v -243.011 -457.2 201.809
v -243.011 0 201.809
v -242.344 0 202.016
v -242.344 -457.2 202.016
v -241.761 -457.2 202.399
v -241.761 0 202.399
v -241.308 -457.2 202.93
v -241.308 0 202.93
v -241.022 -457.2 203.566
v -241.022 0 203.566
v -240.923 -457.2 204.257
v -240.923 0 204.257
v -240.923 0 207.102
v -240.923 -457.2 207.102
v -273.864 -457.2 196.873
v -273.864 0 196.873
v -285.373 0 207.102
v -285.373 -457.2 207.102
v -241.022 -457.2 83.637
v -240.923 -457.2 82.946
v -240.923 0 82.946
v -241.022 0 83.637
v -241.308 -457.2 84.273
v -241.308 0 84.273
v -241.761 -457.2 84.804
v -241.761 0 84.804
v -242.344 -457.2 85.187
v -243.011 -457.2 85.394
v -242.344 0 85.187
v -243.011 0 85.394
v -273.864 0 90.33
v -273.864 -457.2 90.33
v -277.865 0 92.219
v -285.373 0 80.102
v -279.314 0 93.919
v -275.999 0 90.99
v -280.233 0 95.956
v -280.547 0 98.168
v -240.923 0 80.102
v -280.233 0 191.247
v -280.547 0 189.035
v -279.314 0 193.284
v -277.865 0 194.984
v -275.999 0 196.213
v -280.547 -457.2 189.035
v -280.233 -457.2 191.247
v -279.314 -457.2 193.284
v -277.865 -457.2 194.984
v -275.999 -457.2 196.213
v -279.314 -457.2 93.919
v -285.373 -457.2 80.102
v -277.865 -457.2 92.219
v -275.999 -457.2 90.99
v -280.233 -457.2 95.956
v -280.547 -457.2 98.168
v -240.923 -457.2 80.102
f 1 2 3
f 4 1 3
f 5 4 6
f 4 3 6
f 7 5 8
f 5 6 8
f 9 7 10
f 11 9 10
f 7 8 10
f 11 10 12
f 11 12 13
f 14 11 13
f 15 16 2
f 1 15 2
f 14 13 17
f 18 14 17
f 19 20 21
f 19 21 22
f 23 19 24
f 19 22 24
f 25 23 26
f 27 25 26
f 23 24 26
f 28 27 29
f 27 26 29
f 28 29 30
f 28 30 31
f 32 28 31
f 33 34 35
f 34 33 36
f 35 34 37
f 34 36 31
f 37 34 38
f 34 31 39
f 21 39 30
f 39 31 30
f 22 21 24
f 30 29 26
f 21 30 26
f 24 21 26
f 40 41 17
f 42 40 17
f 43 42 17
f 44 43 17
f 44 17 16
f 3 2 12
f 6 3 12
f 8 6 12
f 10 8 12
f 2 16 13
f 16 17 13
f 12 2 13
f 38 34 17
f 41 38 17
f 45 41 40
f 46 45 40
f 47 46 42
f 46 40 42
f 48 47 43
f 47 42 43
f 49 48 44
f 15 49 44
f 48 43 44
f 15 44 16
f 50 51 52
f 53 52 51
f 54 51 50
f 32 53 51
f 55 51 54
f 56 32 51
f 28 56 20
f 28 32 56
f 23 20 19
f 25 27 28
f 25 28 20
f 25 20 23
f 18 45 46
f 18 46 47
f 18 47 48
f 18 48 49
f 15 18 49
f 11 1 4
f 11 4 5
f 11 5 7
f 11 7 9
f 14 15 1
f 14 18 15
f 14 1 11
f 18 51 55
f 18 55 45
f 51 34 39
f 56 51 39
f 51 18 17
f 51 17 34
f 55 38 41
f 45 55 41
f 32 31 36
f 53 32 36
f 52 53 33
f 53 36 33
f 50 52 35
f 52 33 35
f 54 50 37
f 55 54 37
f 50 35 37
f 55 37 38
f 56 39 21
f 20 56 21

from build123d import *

# Parameters (mm, degrees)
F1_DEPTH = 457.2
F0_W     = 25.4
F0_H     = 49.170082
F0_H_2   = 8.8030812
F0_H_3   = 4.7118778
F0_W_2   = 31.496
F0_H_4   = 25.4
F0_W_3   = 6.5532254
F0_H_5   = 4.729226
F0_H_6   = 8.769477
F0_H_7   = 49.202594
F0_W_4   = 31.3436
F0_W_5   = 9.0424
F0_H_8   = 4.724908
F0_H_9   = 8.777859
F0_H_10  = 49.194466
F0_H_11  = 4.9884076
F0_H_12  = 10.7895644
F0_H_13  = 70.044056
F0_W_6   = 35.56
F0_W_7   = 8.1534
F0_H_14  = 90.86723
F0_H_15  = 12.7743204
F0_H_16  = 5.2920646
F0_W_8   = 39.6239238
F0_W_9   = 8.2550254
F0_H_17  = 7.9246984
F0_H_18  = 11.1253016
F0_H_19  = 88.9
F0_H_20  = 11.1252762
F0_H_21  = 7.9247238
F0_H_22  = 7.9249016
F0_H_23  = 12.7
F0_H_24  = 111.1501968
F0_W_10  = 46.8120476
F0_W_11  = 7.9756762
F0_H_25  = 111.1505778
F0_W_12  = 55.5499016
F0_W_13  = 7.8739238
F0_H_26  = 11.0997238
F0_H_27  = 9.525
F0_H_28  = 11.0996984
F0_H_29  = 111.1503746
F0_W_14  = 43.6878222
F0_W_15  = 11.0999016
F0_W_16  = 66.675
F0_W_17  = 8.0264508
F0_H_30  = 14.2746984
F0_H_31  = 98.4505778
F0_H_32  = 14.2747238
F0_W_18  = 80.2641016
F0_W_19  = 8.6358984
F0_H_33  = 20.6247238
F0_H_34  = 6.35
F0_H_35  = 20.6246984


# Not quite as in the source:
# - ends of sketch curves that miss each other by under 0.0002 mm in the source are joined


with BuildPart() as f1:
    # F0 (on Front) → F1 (new body)
    with BuildSketch(Plane.XZ):
        with BuildLine():
            Line((-601.1868342, 387.2012576), (-601.1868342, 311.0012576))
            Line((-601.1868342, 311.0012576), (-565.3728342, 311.0012576))
            Line((-565.3728342, 311.0012576), (-565.3728342, 313.5336122))
            ThreePointArc((-565.3728342, 313.5336122), (-565.9005539947, 314.9657928472), (-567.2313750211, 315.7131515187))
            Line((-567.2313750211, 315.7131515187), (-592.8587584, 319.8135336))
            ThreePointArc((-592.8587584, 319.8135336), (-595.7302015679, 321.4260723396), (-596.8688342, 324.5162166))
            Line((-596.8688342, 324.5162166), (-596.8688342, 373.6862986))
            ThreePointArc((-596.8688342, 373.6862986), (-595.7302015679, 376.7764428604), (-592.8587590083, 378.388985402))
            Line((-592.8587590083, 378.388985402), (-567.2313776, 382.4893798))
            ThreePointArc((-567.2313776, 382.4893798), (-565.9005539947, 383.2367223528), (-565.3728342, 384.668903))
            Line((-565.3728342, 384.668903), (-565.3728342, 387.2012576))
            Line((-565.3728342, 387.2012576), (-601.1868342, 387.2012576))
        make_face()
    extrude(amount=F1_DEPTH)


with BuildPart() as f1b:
    # F0 (on Front) → F1, piece 2 (new body)
    with BuildSketch(Plane.XZ):
        Polygon((-490.1583542, 311.0012576), (-458.6623542, 311.0012576), (-458.6623542, 336.4012576), (-490.1583542, 336.4012576), (-490.1583542, 315.3192576), align=None)
        Polygon((-494.4763542, 311.0012576), (-490.1583542, 311.0012576), (-490.1583542, 315.3192576), align=None)
        Polygon((-490.1583542, 315.3192576), (-490.1583542, 336.4012576), (-494.4763542, 336.4012576), (-494.4763542, 311.0012576), align=None)
    extrude(amount=F1_DEPTH)


with BuildPart() as f1c:
    # F0 (on Front) → F1, piece 3 (new body)
    with BuildSketch(Plane.XZ):
        with Locations((-369.8588742, 349.1012576)):
            Rectangle(F0_W, F0_H)
        with Locations((-369.8588742, 378.0878392)):
            Rectangle(F0_W, F0_H_2)
        with Locations((-369.8588742, 384.8453187)):
            Rectangle(F0_W, F0_H_3)
        Polygon((-357.1588742, 315.7131354), (-357.1588742, 324.5162166), (-382.5588742, 324.5162166), (-382.5588742, 315.7131354), (-377.8469964, 315.7131354), align=None)
        Polygon((-357.1588742, 311.0012576), (-357.1588742, 315.7131354), (-377.8469964, 315.7131354), (-382.5588742, 311.0012576), align=None)
        Polygon((-377.8469964, 315.7131354), (-382.5588742, 315.7131354), (-382.5588742, 311.0012576), align=None)
    extrude(amount=F1_DEPTH)


with BuildPart() as f1d:
    # F0 (on Front) → F1, piece 4 (new body)
    with BuildSketch(Plane.XZ):
        with BuildLine():
            Line((-282.0713942, 387.2012576), (-282.0713942, 311.0012576))
            Line((-282.0713942, 311.0012576), (-244.2253942, 311.0012576))
            Line((-244.2253942, 311.0012576), (-244.2253942, 313.542934))
            ThreePointArc((-244.2253942, 313.542934), (-244.755053678, 314.9803842916), (-246.0907679772, 315.7304974926))
            Line((-246.0907679772, 315.7304974926), (-271.5081184, 319.7972776))
            ThreePointArc((-271.5081184, 319.7972776), (-274.3795615679, 321.4098163396), (-275.5181942, 324.4999606))
            Line((-275.5181942, 324.4999606), (-275.5181942, 373.7025546))
            ThreePointArc((-275.5181942, 373.7025546), (-274.3795615679, 376.7926988604), (-271.5081190083, 378.405241402))
            Line((-271.5081190083, 378.405241402), (-246.0907702, 382.4720316))
            ThreePointArc((-246.0907702, 382.4720316), (-244.755053678, 383.2221309084), (-244.2253942, 384.6595812))
            Line((-244.2253942, 384.6595812), (-244.2253942, 387.2012576))
            Line((-244.2253942, 387.2012576), (-282.0713942, 387.2012576))
        make_face()
    extrude(amount=F1_DEPTH)


with BuildPart() as f1e:
    # F0 (on Front) → F1, piece 5 (new body)
    with BuildSketch(Plane.XZ):
        with Locations((-153.1612888, 323.7012576)):
            Rectangle(F0_W_2, F0_H_4)
        with Locations((-172.1859015, 323.7012576)):
            Rectangle(F0_W_3, F0_H_4)
    extrude(amount=F1_DEPTH)


with BuildPart() as f1f:
    # F0 (on Front) → F1, piece 6 (new body)
    with BuildSketch(Plane.XZ):
        with Locations((-49.7274342, 384.8366446)):
            Rectangle(F0_W, F0_H_5)
        with Locations((-49.7274342, 378.0872931)):
            Rectangle(F0_W, F0_H_6)
        with Locations((-49.7274342, 349.1012576)):
            Rectangle(F0_W, F0_H_7)
        Polygon((-37.0274342, 324.4999606), (-62.4274342, 324.4999606), (-62.4274342, 315.7304836), (-57.6982082, 315.7304836), (-37.0274342, 315.7304836), align=None)
        Polygon((-57.6982082, 315.7304836), (-62.4274342, 315.7304836), (-62.4274342, 311.0012576), align=None)
        Polygon((-57.6982082, 315.7304836), (-62.4274342, 311.0012576), (-37.0274342, 311.0012576), (-37.0274342, 315.7304836), align=None)
    extrude(amount=F1_DEPTH)


with BuildPart() as f1g:
    # F0 (on Front) → F1, piece 7 (new body)
    with BuildSketch(Plane.XZ):
        with BuildLine():
            Line((36.7900458, 387.2012576), (36.7900458, 311.0012576))
            Line((36.7900458, 311.0012576), (77.1760458, 311.0012576))
            Line((77.1760458, 311.0012576), (77.1760458, 313.5405972))
            ThreePointArc((77.1760458, 313.5405972), (76.6468679067, 314.9767339928), (75.3123701078, 315.7261562738))
            Line((75.3123701078, 315.7261562738), (49.8425216, 319.8013416))
            ThreePointArc((49.8425216, 319.8013416), (46.9710784321, 321.4138803396), (45.8324458, 324.5040246))
            Line((45.8324458, 324.5040246), (45.8324458, 373.6984906))
            ThreePointArc((45.8324458, 373.6984906), (46.9710784321, 376.7886348604), (49.8425209917, 378.401177402))
            Line((49.8425209917, 378.401177402), (75.3123716, 382.4763496))
            ThreePointArc((75.3123716, 382.4763496), (76.6468679067, 383.2257812072), (77.1760458, 384.661918))
            Line((77.1760458, 384.661918), (77.1760458, 387.2012576))
            Line((77.1760458, 387.2012576), (36.7900458, 387.2012576))
        make_face()
    extrude(amount=F1_DEPTH)


with BuildPart() as f1h:
    # F0 (on Front) → F1, piece 8 (new body)
    with BuildSketch(Plane.XZ):
        with Locations((168.2020258, 323.7012576)):
            Rectangle(F0_W_4, F0_H_4)
        with Locations((148.0090258, 323.7012576)):
            Rectangle(F0_W_5, F0_H_4)
    extrude(amount=F1_DEPTH)


with BuildPart() as f1i:
    # F0 (on Front) → F1, piece 9 (new body)
    with BuildSketch(Plane.XZ):
        with Locations((270.4040058, 384.8388036)):
            Rectangle(F0_W, F0_H_8)
        with Locations((270.4040058, 378.0874201)):
            Rectangle(F0_W, F0_H_9)
        with Locations((270.4040058, 349.1012576)):
            Rectangle(F0_W, F0_H_10)
        Polygon((283.1040058, 324.5040246), (257.7040058, 324.5040246), (257.7040058, 315.7261656), (262.4289138, 315.7261656), (283.1040058, 315.7261656), align=None)
        Polygon((262.4289138, 315.7261656), (257.7040058, 315.7261656), (257.7040058, 311.0012576), align=None)
        Polygon((262.4289138, 315.7261656), (257.7040058, 311.0012576), (283.1040058, 311.0012576), (283.1040058, 315.7261656), align=None)
    extrude(amount=F1_DEPTH)


with BuildPart() as f1j:
    # F0 (on Front) → F1, piece 10 (new body)
    with BuildSketch(Plane.XZ):
        with BuildLine():
            Line((356.9976858, 412.6012576), (356.9976858, 311.0012576))
            Line((356.9976858, 311.0012576), (397.2312858, 311.0012576))
            Line((397.2312858, 311.0012576), (397.2312858, 313.6822276))
            ThreePointArc((397.2312858, 313.6822276), (396.6725971949, 315.1984578291), (395.2636770123, 315.9896790272))
            Line((395.2636770123, 315.9896790272), (367.0180366, 320.5089856))
            ThreePointArc((367.0180366, 320.5089856), (363.1894572183, 322.6590436143), (361.6712858, 326.7792296))
            Line((361.6712858, 326.7792296), (361.6712858, 396.8232856))
            ThreePointArc((361.6712858, 396.8232856), (363.1894572183, 400.9434715857), (367.0180362116, 403.0935320276))
            Line((367.0180362116, 403.0935320276), (395.2636748, 407.61285))
            ThreePointArc((395.2636748, 407.61285), (396.6725971949, 408.4040573709), (397.2312858, 409.9202876))
            Line((397.2312858, 409.9202876), (397.2312858, 412.6012576))
            Line((397.2312858, 412.6012576), (356.9976858, 412.6012576))
        make_face()
    extrude(amount=F1_DEPTH)


with BuildPart() as f1k:
    # F0 (on Front) → F1, piece 11 (new body)
    with BuildSketch(Plane.XZ):
        Polygon((468.3817658, 336.4012576), (463.7081658, 336.4012576), (463.7081658, 311.0012576), (468.3817658, 315.6748576), align=None)
        Polygon((503.9417658, 336.4012576), (468.3817658, 336.4012576), (468.3817658, 315.6748576), (468.3817658, 311.0012576), (503.9417658, 311.0012576), align=None)
        Polygon((468.3817658, 315.6748576), (463.7081658, 311.0012576), (468.3817658, 311.0012576), align=None)
    extrude(amount=F1_DEPTH)


with BuildPart() as f1l:
    # F0 (on Front) → F1, piece 12 (new body)
    with BuildSketch(Plane.XZ):
        with Locations((590.5354458, 410.1070538)):
            Rectangle(F0_W, F0_H_11)
        with Locations((590.5354458, 402.2180678)):
            Rectangle(F0_W, F0_H_12)
        with Locations((590.5354458, 361.8012576)):
            Rectangle(F0_W, F0_H_13)
        Polygon((603.2354458, 315.9896652), (603.2354458, 326.7792296), (577.8354458, 326.7792296), (577.8354458, 315.9896652), (582.8238534, 315.9896652), align=None)
        Polygon((603.2354458, 311.0012576), (603.2354458, 315.9896652), (582.8238534, 315.9896652), (577.8354458, 311.0012576), align=None)
        Polygon((577.8354458, 311.0012576), (582.8238534, 315.9896652), (577.8354458, 315.9896652), align=None)
    extrude(amount=F1_DEPTH)


with BuildPart() as f1m:
    # F0 (on Front) → F1, piece 13 (new body)
    with BuildSketch(Plane.XZ):
        with BuildLine():
            ThreePointArc((-591.6363837884, 89.6092671724), (-595.4649627817, 91.7593276143), (-596.9831342, 95.8795136))
            Line((-596.9831342, 95.8795136), (-596.9831342, 165.9235696))
            ThreePointArc((-596.9831342, 165.9235696), (-595.4649627817, 170.0437555857), (-591.6363837884, 172.1938160276))
            Line((-591.6363837884, 172.1938160276), (-563.3907452, 176.713134))
            ThreePointArc((-563.3907452, 176.713134), (-561.9818228051, 177.5043413709), (-561.4231342, 179.0205716))
            Line((-561.4231342, 179.0205716), (-561.4231342, 181.7015416))
            Line((-561.4231342, 181.7015416), (-605.1365342, 181.7015416))
            Line((-605.1365342, 181.7015416), (-605.1365342, 80.1015416))
            Line((-605.1365342, 80.1015416), (-561.4231342, 80.1015416))
            Line((-561.4231342, 80.1015416), (-561.4231342, 82.7825116))
            ThreePointArc((-561.4231342, 82.7825116), (-561.9818228051, 84.2987418291), (-563.3907429877, 85.0899630272))
            Line((-563.3907429877, 85.0899630272), (-591.6363837884, 89.6092671724))
        make_face()
    extrude(amount=F1_DEPTH)


with BuildPart() as f1n:
    # F0 (on Front) → F1, piece 14 (new body)
    with BuildSketch(Plane.XZ):
        with Locations((-472.5053542, 92.8015416)):
            Rectangle(F0_W_6, F0_H_4)
        with Locations((-494.3620542, 92.8015416)):
            Rectangle(F0_W_7, F0_H_4)
    extrude(amount=F1_DEPTH)


with BuildPart() as f1o:
    # F0 (on Front) → F1, piece 15 (new body)
    with BuildSketch(Plane.XZ):
        Polygon((-382.5588742, 80.1015416), (-357.1588742, 80.1015416), (-357.1588742, 85.0899492), (-377.5704666, 85.0899492), align=None)
        Polygon((-382.5588742, 85.0899492), (-382.5588742, 80.1015416), (-377.5704666, 85.0899492), align=None)
        Polygon((-377.5704666, 85.0899492), (-357.1588742, 85.0899492), (-357.1588742, 95.8795136), (-382.5588742, 95.8795136), (-382.5588742, 85.0899492), align=None)
        with Locations((-369.8588742, 130.9015416)):
            Rectangle(F0_W, F0_H_13)
        with Locations((-369.8588742, 171.3183518)):
            Rectangle(F0_W, F0_H_12)
        with Locations((-369.8588742, 179.2073378)):
            Rectangle(F0_W, F0_H_11)
    extrude(amount=F1_DEPTH)


with BuildPart() as f1p:
    # F0 (on Front) → F1, piece 16 (new body)
    with BuildSketch(Plane.XZ):
        with BuildLine():
            Line((-285.3733942, 207.1015416), (-285.3733942, 80.1015416))
            Line((-285.3733942, 80.1015416), (-240.9233942, 80.1015416))
            Line((-240.9233942, 80.1015416), (-240.9233942, 82.9457066))
            ThreePointArc((-240.9233942, 82.9457066), (-241.5160882904, 84.5542271722), (-243.0107654656, 85.3936107901))
            Line((-243.0107654656, 85.3936107901), (-273.863943, 90.3301216))
            ThreePointArc((-273.863943, 90.3301216), (-278.6496758587, 93.0176893467), (-280.5473942, 98.1679266))
            Line((-280.5473942, 98.1679266), (-280.5473942, 189.0351566))
            ThreePointArc((-280.5473942, 189.0351566), (-278.6496758587, 194.1853938533), (-273.8639438025, 196.8729666158))
            Line((-273.8639438025, 196.8729666158), (-243.0107662, 201.809477))
            ThreePointArc((-243.0107662, 201.809477), (-241.5160882904, 202.6488560278), (-240.9233942, 204.2573766))
            Line((-240.9233942, 204.2573766), (-240.9233942, 207.1015416))
            Line((-240.9233942, 207.1015416), (-285.3733942, 207.1015416))
        make_face()
    extrude(amount=F1_DEPTH)


with BuildPart() as f1q:
    # F0 (on Front) → F1, piece 17 (new body)
    with BuildSketch(Plane.XZ):
        Polygon((-173.8369142, 80.1015416), (-134.2129142, 80.1015416), (-134.2129142, 105.5015416), (-173.8369142, 105.5015416), (-173.8369142, 84.9275416), align=None)
        Polygon((-178.6629142, 80.1015416), (-173.8369142, 80.1015416), (-173.8369142, 84.9275416), align=None)
        Polygon((-173.8369142, 84.9275416), (-173.8369142, 105.5015416), (-178.6629142, 105.5015416), (-178.6629142, 80.1015416), align=None)
    extrude(amount=F1_DEPTH)


with BuildPart() as f1r:
    # F0 (on Front) → F1, piece 18 (new body)
    with BuildSketch(Plane.XZ):
        Polygon((-62.4274342, 80.1015416), (-37.0274342, 80.1015416), (-37.0274342, 85.3936062), (-57.1353696, 85.3936062), align=None)
        Polygon((-57.1353696, 85.3936062), (-37.0274342, 85.3936062), (-37.0274342, 98.1679266), (-62.4274342, 98.1679266), (-62.4274342, 85.3936062), align=None)
        Polygon((-62.4274342, 85.3936062), (-62.4274342, 80.1015416), (-57.1353696, 85.3936062), align=None)
        with Locations((-49.7274342, 143.6015416)):
            Rectangle(F0_W, F0_H_14)
        with Locations((-49.7274342, 195.4223168)):
            Rectangle(F0_W, F0_H_15)
        with Locations((-49.7274342, 204.4555093)):
            Rectangle(F0_W, F0_H_16)
    extrude(amount=F1_DEPTH)


with BuildPart() as f1s:
    # F0 (on Front) → F1, piece 19 (new body)
    with BuildSketch(Plane.XZ):
        with BuildLine():
            ThreePointArc((47.9819961975, 90.3301165842), (43.1962641413, 93.0176893467), (41.2985458, 98.1679266))
            Line((41.2985458, 98.1679266), (41.2985458, 189.0351566))
            ThreePointArc((41.2985458, 189.0351566), (43.1962641413, 194.1853938533), (47.9819961975, 196.8729666158))
            Line((47.9819961975, 196.8729666158), (78.8351738, 201.809477))
            ThreePointArc((78.8351738, 201.809477), (80.3298517096, 202.6488560278), (80.9225458, 204.2573766))
            Line((80.9225458, 204.2573766), (80.9225458, 207.1015416))
            Line((80.9225458, 207.1015416), (33.0435458, 207.1015416))
            Line((33.0435458, 207.1015416), (33.0435458, 80.1015416))
            Line((33.0435458, 80.1015416), (80.9225458, 80.1015416))
            Line((80.9225458, 80.1015416), (80.9225458, 82.9457066))
            ThreePointArc((80.9225458, 82.9457066), (80.3298517096, 84.5542271722), (78.8351745344, 85.3936107901))
            Line((78.8351745344, 85.3936107901), (47.9819961975, 90.3301165842))
        make_face()
    extrude(amount=F1_DEPTH)


with BuildPart() as f1t:
    # F0 (on Front) → F1, piece 20 (new body)
    with BuildSketch(Plane.XZ):
        with Locations((167.8083131, 92.8015416)):
            Rectangle(F0_W_8, F0_H_4)
        with Locations((143.8688385, 92.8015416)):
            Rectangle(F0_W_9, F0_H_4)
    extrude(amount=F1_DEPTH)


with BuildPart() as f1u:
    # F0 (on Front) → F1, piece 21 (new body)
    with BuildSketch(Plane.XZ):
        with Locations((270.4040058, 84.0638908)):
            Rectangle(F0_W, F0_H_17)
        with Locations((270.4040058, 93.5888908)):
            Rectangle(F0_W, F0_H_18)
        with Locations((270.4040058, 143.6015416)):
            Rectangle(F0_W, F0_H_19)
        with Locations((270.4040058, 193.6141797)):
            Rectangle(F0_W, F0_H_20)
        with Locations((270.4040058, 203.1391797)):
            Rectangle(F0_W, F0_H_21)
    extrude(amount=F1_DEPTH)


with BuildPart() as f1v:
    # F0 (on Front) → F1, piece 22 (new body)
    with BuildSketch(Plane.XZ):
        with BuildLine():
            ThreePointArc((365.8306401459, 91.025565362), (360.0877523662, 94.2506495524), (357.8104858, 100.4309396))
            Line((357.8104858, 100.4309396), (357.8104858, 212.1721436))
            ThreePointArc((357.8104858, 212.1721436), (360.0877523662, 218.3524336476), (365.8306401459, 221.577517838))
            Line((365.8306401459, 221.577517838), (399.3020462, 226.9329472))
            ThreePointArc((399.3020462, 226.9329472), (400.8748228991, 227.816191046), (401.4984858, 229.5087612))
            Line((401.4984858, 229.5087612), (401.4984858, 232.5015416))
            Line((401.4984858, 232.5015416), (352.7304858, 232.5015416))
            Line((352.7304858, 232.5015416), (352.7304858, 80.1015416))
            Line((352.7304858, 80.1015416), (401.4984858, 80.1015416))
            Line((401.4984858, 80.1015416), (401.4984858, 83.094322))
            ThreePointArc((401.4984858, 83.094322), (400.8748228991, 84.786892154), (399.3020465678, 85.6701382986))
            Line((399.3020465678, 85.6701382986), (365.8306401459, 91.025565362))
        make_face()
    extrude(amount=F1_DEPTH)


with BuildPart() as f1w:
    # F0 (on Front) → F1, piece 23 (new body)
    with BuildSketch(Plane.XZ):
        Polygon((464.5209912, 80.1015416), (508.208915, 80.1015416), (508.208915, 105.5015416), (464.5209912, 105.5015416), (464.5209912, 85.181567), align=None)
        Polygon((459.4409658, 80.1015416), (464.5209912, 80.1015416), (464.5209912, 85.181567), align=None)
        Polygon((464.5209912, 85.181567), (464.5209912, 105.5015416), (459.4409658, 105.5015416), (459.4409658, 80.1015416), align=None)
    extrude(amount=F1_DEPTH)


with BuildPart() as f1x:
    # F0 (on Front) → F1, piece 24 (new body)
    with BuildSketch(Plane.XZ):
        with Locations((590.5354458, 228.5390908)):
            Rectangle(F0_W, F0_H_22)
        with Locations((590.5354458, 218.22664)):
            Rectangle(F0_W, F0_H_23)
        with Locations((590.5354458, 156.3015416)):
            Rectangle(F0_W, F0_H_24)
        with Locations((590.5354458, 94.3764432)):
            Rectangle(F0_W, F0_H_23)
        with Locations((590.5354458, 84.0639924)):
            Rectangle(F0_W, F0_H_22)
    extrude(amount=F1_DEPTH)


with BuildPart() as f1y:
    # F0 (on Front) → F1, piece 25 (new body)
    with BuildSketch(Plane.XZ):
        with BuildLine():
            Line((-609.1116342, 1.6018256), (-609.1116342, -150.7981744))
            Line((-609.1116342, -150.7981744), (-557.4480342, -150.7981744))
            Line((-557.4480342, -150.7981744), (-557.4480342, -147.805394))
            ThreePointArc((-557.4480342, -147.805394), (-558.0716971009, -146.112823846), (-559.6444734322, -145.2295777014))
            Line((-559.6444734322, -145.2295777014), (-593.1158826, -139.8741678))
            ThreePointArc((-593.1158826, -139.8741678), (-598.8587676338, -136.6490664476), (-601.1360342, -130.4687764))
            Line((-601.1360342, -130.4687764), (-601.1360342, -18.7275724))
            ThreePointArc((-601.1360342, -18.7275724), (-598.8587676338, -12.5472823524), (-593.1158798541, -9.322198162))
            Line((-593.1158798541, -9.322198162), (-559.6444738, -3.9667688))
            ThreePointArc((-559.6444738, -3.9667688), (-558.0716971009, -3.083524954), (-557.4480342, -1.3909548))
            Line((-557.4480342, -1.3909548), (-557.4480342, 1.6018256))
            Line((-557.4480342, 1.6018256), (-609.1116342, 1.6018256))
        make_face()
    extrude(amount=F1_DEPTH)


with BuildPart() as f1z:
    # F0 (on Front) → F1, piece 26 (new body)
    with BuildSketch(Plane.XZ):
        with Locations((-472.5942542, -138.0981744)):
            Rectangle(F0_W_10, F0_H_4)
        with Locations((-499.9881161, -138.0981744)):
            Rectangle(F0_W_11, F0_H_4)
    extrude(amount=F1_DEPTH)


with BuildPart() as f1ba:
    # F0 (on Front) → F1, piece 27 (new body)
    with BuildSketch(Plane.XZ):
        with Locations((-369.8588742, -146.8358252)):
            Rectangle(F0_W, F0_H_17)
        with Locations((-369.8588742, -136.523476)):
            Rectangle(F0_W, F0_H_23)
        with Locations((-369.8588742, -74.5981871)):
            Rectangle(F0_W, F0_H_25)
        with Locations((-369.8588742, -12.6728982)):
            Rectangle(F0_W, F0_H_23)
        with Locations((-369.8588742, -2.3605363)):
            Rectangle(F0_W, F0_H_21)
    extrude(amount=F1_DEPTH)


with BuildPart() as f1bb:
    # F0 (on Front) → F1, piece 28 (new body)
    with BuildSketch(Plane.XZ):
        with BuildLine():
            Line((-294.8602942, 1.6018256), (-294.8602942, -150.7981744))
            Line((-294.8602942, -150.7981744), (-231.4364942, -150.7981744))
            Line((-231.4364942, -150.7981744), (-231.4364942, -147.883499))
            ThreePointArc((-231.4364942, -147.883499), (-232.043887476, -146.2350911736), (-233.5756320118, -145.3748972241))
            Line((-233.5756320118, -145.3748972241), (-278.9661426, -138.1124238))
            ThreePointArc((-278.9661426, -138.1124238), (-284.7090276338, -134.8873224476), (-286.9862942, -128.7070324))
            Line((-286.9862942, -128.7070324), (-286.9862942, -20.4893164))
            ThreePointArc((-286.9862942, -20.4893164), (-284.7090276338, -14.3090263524), (-278.9661398541, -11.083942162))
            Line((-278.9661398541, -11.083942162), (-233.5756314, -3.8214554))
            ThreePointArc((-233.5756314, -3.8214554), (-232.043887476, -2.9612576264), (-231.4364942, -1.3128498))
            Line((-231.4364942, -1.3128498), (-231.4364942, 1.6018256))
            Line((-231.4364942, 1.6018256), (-294.8602942, 1.6018256))
        make_face()
    extrude(amount=F1_DEPTH)


with BuildPart() as f1bc:
    # F0 (on Front) → F1, piece 29 (new body)
    with BuildSketch(Plane.XZ):
        with Locations((-152.5009396, -138.0981744)):
            Rectangle(F0_W_12, F0_H_4)
        with Locations((-184.2128523, -138.0981744)):
            Rectangle(F0_W_13, F0_H_4)
    extrude(amount=F1_DEPTH)


with BuildPart() as f1bd:
    # F0 (on Front) → F1, piece 30 (new body)
    with BuildSketch(Plane.XZ):
        with Locations((-49.7274342, -13.4730363)):
            Rectangle(F0_W, F0_H_26)
        with Locations((-49.7274342, -74.5981871)):
            Rectangle(F0_W, F0_H_25)
        with Locations((-49.7274342, -3.1606744)):
            Rectangle(F0_W, F0_H_27)
        with Locations((-49.7274342, -135.7233252)):
            Rectangle(F0_W, F0_H_28)
        with Locations((-49.7274342, -146.0356744)):
            Rectangle(F0_W, F0_H_27)
    extrude(amount=F1_DEPTH)


with BuildPart() as f1be:
    # F0 (on Front) → F1, piece 31 (new body)
    with BuildSketch(Plane.XZ):
        with BuildLine():
            Line((29.5891458, 1.6018256), (29.5891458, -150.7981744))
            Line((29.5891458, -150.7981744), (84.3769458, -150.7981744))
            Line((84.3769458, -150.7981744), (84.3769458, -147.805394))
            ThreePointArc((84.3769458, -147.805394), (83.7532828991, -146.112823846), (82.1805065678, -145.2295777014))
            Line((82.1805065678, -145.2295777014), (48.7090974, -139.8741678))
            ThreePointArc((48.7090974, -139.8741678), (42.9662123662, -136.6490664476), (40.6889458, -130.4687764))
            Line((40.6889458, -130.4687764), (40.6889458, -18.7275724))
            ThreePointArc((40.6889458, -18.7275724), (42.9662123662, -12.5472823524), (48.7091001459, -9.322198162))
            Line((48.7091001459, -9.322198162), (82.1805062, -3.9667688))
            ThreePointArc((82.1805062, -3.9667688), (83.7532828991, -3.083524954), (84.3769458, -1.3909548))
            Line((84.3769458, -1.3909548), (84.3769458, 1.6018256))
            Line((84.3769458, 1.6018256), (29.5891458, 1.6018256))
        make_face()
    extrude(amount=F1_DEPTH)


with BuildPart() as f1bf:
    # F0 (on Front) → F1, piece 32 (new body)
    with BuildSketch(Plane.XZ):
        with Locations((163.6935258, -74.5982633)):
            Rectangle(F0_W, F0_H_29)
        with Locations((163.6935258, -136.5234506)):
            Rectangle(F0_W, F0_H_23)
        with Locations((163.6935258, -12.673076)):
            Rectangle(F0_W, F0_H_23)
        with Locations((163.6935258, -146.8358125)):
            Rectangle(F0_W, F0_H_21)
        with Locations((163.6935258, -2.3606252)):
            Rectangle(F0_W, F0_H_22)
    extrude(amount=F1_DEPTH)


with BuildPart() as f1bg:
    # F0 (on Front) → F1, piece 33 (new body)
    with BuildSketch(Plane.XZ):
        with Locations((275.9412185, -138.0981744)):
            Rectangle(F0_W_14, F0_H_4)
        with Locations((248.5473566, -138.0981744)):
            Rectangle(F0_W_15, F0_H_4)
    extrude(amount=F1_DEPTH)


with BuildPart() as f1bh:
    # F0 (on Front) → F1, piece 34 (new body)
    with BuildSketch(Plane.XZ):
        with BuildLine():
            Line((339.7637858, 1.6018256), (339.7637858, -150.7981744))
            Line((339.7637858, -150.7981744), (414.4651858, -150.7981744))
            Line((414.4651858, -150.7981744), (414.4651858, -146.9369934))
            ThreePointArc((414.4651858, -146.9369934), (413.6605551761, -144.7532950948), (411.6314087753, -143.6137629043))
            Line((411.6314087753, -143.6137629043), (355.8103374, -134.6824078))
            ThreePointArc((355.8103374, -134.6824078), (350.0674523662, -131.4573064476), (347.7901858, -125.2770164))
            Line((347.7901858, -125.2770164), (347.7901858, -23.9193324))
            ThreePointArc((347.7901858, -23.9193324), (350.0674523662, -17.7390423524), (355.8103401459, -14.513958162))
            Line((355.8103401459, -14.513958162), (411.6314094, -5.5825898))
            ThreePointArc((411.6314094, -5.5825898), (413.6605551761, -4.4430537052), (414.4651858, -2.2593554))
            Line((414.4651858, -2.2593554), (414.4651858, 1.6018256))
            Line((414.4651858, 1.6018256), (339.7637858, 1.6018256))
        make_face()
    extrude(amount=F1_DEPTH)


with BuildPart() as f1bi:
    # F0 (on Front) → F1, piece 35 (new body)
    with BuildSketch(Plane.XZ):
        with Locations((487.8382166, -138.0981744)):
            Rectangle(F0_W_16, F0_H_4)
        with Locations((450.4874912, -138.0981744)):
            Rectangle(F0_W_17, F0_H_4)
    extrude(amount=F1_DEPTH)


with BuildPart() as f1bj:
    # F0 (on Front) → F1, piece 36 (new body)
    with BuildSketch(Plane.XZ):
        with Locations((590.5354458, -144.4481744)):
            Rectangle(F0_W, F0_H_23)
        with Locations((590.5354458, -130.9608252)):
            Rectangle(F0_W, F0_H_30)
        with Locations((590.5354458, -74.5981871)):
            Rectangle(F0_W, F0_H_31)
        with Locations((590.5354458, -18.2355363)):
            Rectangle(F0_W, F0_H_32)
        with Locations((590.5354458, -4.7481744)):
            Rectangle(F0_W, F0_H_23)
    extrude(amount=F1_DEPTH)


with BuildPart() as f1bk:
    # F0 (on Front) → F1, piece 37 (new body)
    with BuildSketch(Plane.XZ):
        with BuildLine():
            Line((-621.3798342, -229.2978904), (-621.3798342, -381.6978904))
            Line((-621.3798342, -381.6978904), (-545.1798342, -381.6978904))
            Line((-545.1798342, -381.6978904), (-545.1798342, -377.8367094))
            ThreePointArc((-545.1798342, -377.8367094), (-545.9844648239, -375.6530110948), (-548.0136112247, -374.5134789043))
            Line((-548.0136112247, -374.5134789043), (-603.8346826, -365.5821238))
            ThreePointArc((-603.8346826, -365.5821238), (-609.5775676338, -362.3570224476), (-611.8548342, -356.1767324))
            Line((-611.8548342, -356.1767324), (-611.8548342, -254.8190484))
            ThreePointArc((-611.8548342, -254.8190484), (-609.5775676338, -248.6387583524), (-603.8346798541, -245.413674162))
            Line((-603.8346798541, -245.413674162), (-548.0136106, -236.4823058))
            ThreePointArc((-548.0136106, -236.4823058), (-545.9844648239, -235.3427697052), (-545.1798342, -233.1590714))
            Line((-545.1798342, -233.1590714), (-545.1798342, -229.2978904))
            Line((-545.1798342, -229.2978904), (-621.3798342, -229.2978904))
        make_face()
    extrude(amount=F1_DEPTH)


with BuildPart() as f1bl:
    # F0 (on Front) → F1, piece 38 (new body)
    with BuildSketch(Plane.XZ):
        with Locations((-472.264105, -368.9978904)):
            Rectangle(F0_W_18, F0_H_4)
        with Locations((-516.714105, -368.9978904)):
            Rectangle(F0_W_19, F0_H_4)
    extrude(amount=F1_DEPTH)


with BuildPart() as f1bm:
    # F0 (on Front) → F1, piece 39 (new body)
    with BuildSketch(Plane.XZ):
        with Locations((-369.8588742, -245.9602523)):
            Rectangle(F0_W, F0_H_33)
        with Locations((-369.8588742, -305.4979031)):
            Rectangle(F0_W, F0_H_31)
        with Locations((-369.8588742, -232.4728904)):
            Rectangle(F0_W, F0_H_34)
        with Locations((-369.8588742, -365.0355412)):
            Rectangle(F0_W, F0_H_35)
        with Locations((-369.8588742, -378.5228904)):
            Rectangle(F0_W, F0_H_34)
    extrude(amount=F1_DEPTH)


solid = f1p.part
